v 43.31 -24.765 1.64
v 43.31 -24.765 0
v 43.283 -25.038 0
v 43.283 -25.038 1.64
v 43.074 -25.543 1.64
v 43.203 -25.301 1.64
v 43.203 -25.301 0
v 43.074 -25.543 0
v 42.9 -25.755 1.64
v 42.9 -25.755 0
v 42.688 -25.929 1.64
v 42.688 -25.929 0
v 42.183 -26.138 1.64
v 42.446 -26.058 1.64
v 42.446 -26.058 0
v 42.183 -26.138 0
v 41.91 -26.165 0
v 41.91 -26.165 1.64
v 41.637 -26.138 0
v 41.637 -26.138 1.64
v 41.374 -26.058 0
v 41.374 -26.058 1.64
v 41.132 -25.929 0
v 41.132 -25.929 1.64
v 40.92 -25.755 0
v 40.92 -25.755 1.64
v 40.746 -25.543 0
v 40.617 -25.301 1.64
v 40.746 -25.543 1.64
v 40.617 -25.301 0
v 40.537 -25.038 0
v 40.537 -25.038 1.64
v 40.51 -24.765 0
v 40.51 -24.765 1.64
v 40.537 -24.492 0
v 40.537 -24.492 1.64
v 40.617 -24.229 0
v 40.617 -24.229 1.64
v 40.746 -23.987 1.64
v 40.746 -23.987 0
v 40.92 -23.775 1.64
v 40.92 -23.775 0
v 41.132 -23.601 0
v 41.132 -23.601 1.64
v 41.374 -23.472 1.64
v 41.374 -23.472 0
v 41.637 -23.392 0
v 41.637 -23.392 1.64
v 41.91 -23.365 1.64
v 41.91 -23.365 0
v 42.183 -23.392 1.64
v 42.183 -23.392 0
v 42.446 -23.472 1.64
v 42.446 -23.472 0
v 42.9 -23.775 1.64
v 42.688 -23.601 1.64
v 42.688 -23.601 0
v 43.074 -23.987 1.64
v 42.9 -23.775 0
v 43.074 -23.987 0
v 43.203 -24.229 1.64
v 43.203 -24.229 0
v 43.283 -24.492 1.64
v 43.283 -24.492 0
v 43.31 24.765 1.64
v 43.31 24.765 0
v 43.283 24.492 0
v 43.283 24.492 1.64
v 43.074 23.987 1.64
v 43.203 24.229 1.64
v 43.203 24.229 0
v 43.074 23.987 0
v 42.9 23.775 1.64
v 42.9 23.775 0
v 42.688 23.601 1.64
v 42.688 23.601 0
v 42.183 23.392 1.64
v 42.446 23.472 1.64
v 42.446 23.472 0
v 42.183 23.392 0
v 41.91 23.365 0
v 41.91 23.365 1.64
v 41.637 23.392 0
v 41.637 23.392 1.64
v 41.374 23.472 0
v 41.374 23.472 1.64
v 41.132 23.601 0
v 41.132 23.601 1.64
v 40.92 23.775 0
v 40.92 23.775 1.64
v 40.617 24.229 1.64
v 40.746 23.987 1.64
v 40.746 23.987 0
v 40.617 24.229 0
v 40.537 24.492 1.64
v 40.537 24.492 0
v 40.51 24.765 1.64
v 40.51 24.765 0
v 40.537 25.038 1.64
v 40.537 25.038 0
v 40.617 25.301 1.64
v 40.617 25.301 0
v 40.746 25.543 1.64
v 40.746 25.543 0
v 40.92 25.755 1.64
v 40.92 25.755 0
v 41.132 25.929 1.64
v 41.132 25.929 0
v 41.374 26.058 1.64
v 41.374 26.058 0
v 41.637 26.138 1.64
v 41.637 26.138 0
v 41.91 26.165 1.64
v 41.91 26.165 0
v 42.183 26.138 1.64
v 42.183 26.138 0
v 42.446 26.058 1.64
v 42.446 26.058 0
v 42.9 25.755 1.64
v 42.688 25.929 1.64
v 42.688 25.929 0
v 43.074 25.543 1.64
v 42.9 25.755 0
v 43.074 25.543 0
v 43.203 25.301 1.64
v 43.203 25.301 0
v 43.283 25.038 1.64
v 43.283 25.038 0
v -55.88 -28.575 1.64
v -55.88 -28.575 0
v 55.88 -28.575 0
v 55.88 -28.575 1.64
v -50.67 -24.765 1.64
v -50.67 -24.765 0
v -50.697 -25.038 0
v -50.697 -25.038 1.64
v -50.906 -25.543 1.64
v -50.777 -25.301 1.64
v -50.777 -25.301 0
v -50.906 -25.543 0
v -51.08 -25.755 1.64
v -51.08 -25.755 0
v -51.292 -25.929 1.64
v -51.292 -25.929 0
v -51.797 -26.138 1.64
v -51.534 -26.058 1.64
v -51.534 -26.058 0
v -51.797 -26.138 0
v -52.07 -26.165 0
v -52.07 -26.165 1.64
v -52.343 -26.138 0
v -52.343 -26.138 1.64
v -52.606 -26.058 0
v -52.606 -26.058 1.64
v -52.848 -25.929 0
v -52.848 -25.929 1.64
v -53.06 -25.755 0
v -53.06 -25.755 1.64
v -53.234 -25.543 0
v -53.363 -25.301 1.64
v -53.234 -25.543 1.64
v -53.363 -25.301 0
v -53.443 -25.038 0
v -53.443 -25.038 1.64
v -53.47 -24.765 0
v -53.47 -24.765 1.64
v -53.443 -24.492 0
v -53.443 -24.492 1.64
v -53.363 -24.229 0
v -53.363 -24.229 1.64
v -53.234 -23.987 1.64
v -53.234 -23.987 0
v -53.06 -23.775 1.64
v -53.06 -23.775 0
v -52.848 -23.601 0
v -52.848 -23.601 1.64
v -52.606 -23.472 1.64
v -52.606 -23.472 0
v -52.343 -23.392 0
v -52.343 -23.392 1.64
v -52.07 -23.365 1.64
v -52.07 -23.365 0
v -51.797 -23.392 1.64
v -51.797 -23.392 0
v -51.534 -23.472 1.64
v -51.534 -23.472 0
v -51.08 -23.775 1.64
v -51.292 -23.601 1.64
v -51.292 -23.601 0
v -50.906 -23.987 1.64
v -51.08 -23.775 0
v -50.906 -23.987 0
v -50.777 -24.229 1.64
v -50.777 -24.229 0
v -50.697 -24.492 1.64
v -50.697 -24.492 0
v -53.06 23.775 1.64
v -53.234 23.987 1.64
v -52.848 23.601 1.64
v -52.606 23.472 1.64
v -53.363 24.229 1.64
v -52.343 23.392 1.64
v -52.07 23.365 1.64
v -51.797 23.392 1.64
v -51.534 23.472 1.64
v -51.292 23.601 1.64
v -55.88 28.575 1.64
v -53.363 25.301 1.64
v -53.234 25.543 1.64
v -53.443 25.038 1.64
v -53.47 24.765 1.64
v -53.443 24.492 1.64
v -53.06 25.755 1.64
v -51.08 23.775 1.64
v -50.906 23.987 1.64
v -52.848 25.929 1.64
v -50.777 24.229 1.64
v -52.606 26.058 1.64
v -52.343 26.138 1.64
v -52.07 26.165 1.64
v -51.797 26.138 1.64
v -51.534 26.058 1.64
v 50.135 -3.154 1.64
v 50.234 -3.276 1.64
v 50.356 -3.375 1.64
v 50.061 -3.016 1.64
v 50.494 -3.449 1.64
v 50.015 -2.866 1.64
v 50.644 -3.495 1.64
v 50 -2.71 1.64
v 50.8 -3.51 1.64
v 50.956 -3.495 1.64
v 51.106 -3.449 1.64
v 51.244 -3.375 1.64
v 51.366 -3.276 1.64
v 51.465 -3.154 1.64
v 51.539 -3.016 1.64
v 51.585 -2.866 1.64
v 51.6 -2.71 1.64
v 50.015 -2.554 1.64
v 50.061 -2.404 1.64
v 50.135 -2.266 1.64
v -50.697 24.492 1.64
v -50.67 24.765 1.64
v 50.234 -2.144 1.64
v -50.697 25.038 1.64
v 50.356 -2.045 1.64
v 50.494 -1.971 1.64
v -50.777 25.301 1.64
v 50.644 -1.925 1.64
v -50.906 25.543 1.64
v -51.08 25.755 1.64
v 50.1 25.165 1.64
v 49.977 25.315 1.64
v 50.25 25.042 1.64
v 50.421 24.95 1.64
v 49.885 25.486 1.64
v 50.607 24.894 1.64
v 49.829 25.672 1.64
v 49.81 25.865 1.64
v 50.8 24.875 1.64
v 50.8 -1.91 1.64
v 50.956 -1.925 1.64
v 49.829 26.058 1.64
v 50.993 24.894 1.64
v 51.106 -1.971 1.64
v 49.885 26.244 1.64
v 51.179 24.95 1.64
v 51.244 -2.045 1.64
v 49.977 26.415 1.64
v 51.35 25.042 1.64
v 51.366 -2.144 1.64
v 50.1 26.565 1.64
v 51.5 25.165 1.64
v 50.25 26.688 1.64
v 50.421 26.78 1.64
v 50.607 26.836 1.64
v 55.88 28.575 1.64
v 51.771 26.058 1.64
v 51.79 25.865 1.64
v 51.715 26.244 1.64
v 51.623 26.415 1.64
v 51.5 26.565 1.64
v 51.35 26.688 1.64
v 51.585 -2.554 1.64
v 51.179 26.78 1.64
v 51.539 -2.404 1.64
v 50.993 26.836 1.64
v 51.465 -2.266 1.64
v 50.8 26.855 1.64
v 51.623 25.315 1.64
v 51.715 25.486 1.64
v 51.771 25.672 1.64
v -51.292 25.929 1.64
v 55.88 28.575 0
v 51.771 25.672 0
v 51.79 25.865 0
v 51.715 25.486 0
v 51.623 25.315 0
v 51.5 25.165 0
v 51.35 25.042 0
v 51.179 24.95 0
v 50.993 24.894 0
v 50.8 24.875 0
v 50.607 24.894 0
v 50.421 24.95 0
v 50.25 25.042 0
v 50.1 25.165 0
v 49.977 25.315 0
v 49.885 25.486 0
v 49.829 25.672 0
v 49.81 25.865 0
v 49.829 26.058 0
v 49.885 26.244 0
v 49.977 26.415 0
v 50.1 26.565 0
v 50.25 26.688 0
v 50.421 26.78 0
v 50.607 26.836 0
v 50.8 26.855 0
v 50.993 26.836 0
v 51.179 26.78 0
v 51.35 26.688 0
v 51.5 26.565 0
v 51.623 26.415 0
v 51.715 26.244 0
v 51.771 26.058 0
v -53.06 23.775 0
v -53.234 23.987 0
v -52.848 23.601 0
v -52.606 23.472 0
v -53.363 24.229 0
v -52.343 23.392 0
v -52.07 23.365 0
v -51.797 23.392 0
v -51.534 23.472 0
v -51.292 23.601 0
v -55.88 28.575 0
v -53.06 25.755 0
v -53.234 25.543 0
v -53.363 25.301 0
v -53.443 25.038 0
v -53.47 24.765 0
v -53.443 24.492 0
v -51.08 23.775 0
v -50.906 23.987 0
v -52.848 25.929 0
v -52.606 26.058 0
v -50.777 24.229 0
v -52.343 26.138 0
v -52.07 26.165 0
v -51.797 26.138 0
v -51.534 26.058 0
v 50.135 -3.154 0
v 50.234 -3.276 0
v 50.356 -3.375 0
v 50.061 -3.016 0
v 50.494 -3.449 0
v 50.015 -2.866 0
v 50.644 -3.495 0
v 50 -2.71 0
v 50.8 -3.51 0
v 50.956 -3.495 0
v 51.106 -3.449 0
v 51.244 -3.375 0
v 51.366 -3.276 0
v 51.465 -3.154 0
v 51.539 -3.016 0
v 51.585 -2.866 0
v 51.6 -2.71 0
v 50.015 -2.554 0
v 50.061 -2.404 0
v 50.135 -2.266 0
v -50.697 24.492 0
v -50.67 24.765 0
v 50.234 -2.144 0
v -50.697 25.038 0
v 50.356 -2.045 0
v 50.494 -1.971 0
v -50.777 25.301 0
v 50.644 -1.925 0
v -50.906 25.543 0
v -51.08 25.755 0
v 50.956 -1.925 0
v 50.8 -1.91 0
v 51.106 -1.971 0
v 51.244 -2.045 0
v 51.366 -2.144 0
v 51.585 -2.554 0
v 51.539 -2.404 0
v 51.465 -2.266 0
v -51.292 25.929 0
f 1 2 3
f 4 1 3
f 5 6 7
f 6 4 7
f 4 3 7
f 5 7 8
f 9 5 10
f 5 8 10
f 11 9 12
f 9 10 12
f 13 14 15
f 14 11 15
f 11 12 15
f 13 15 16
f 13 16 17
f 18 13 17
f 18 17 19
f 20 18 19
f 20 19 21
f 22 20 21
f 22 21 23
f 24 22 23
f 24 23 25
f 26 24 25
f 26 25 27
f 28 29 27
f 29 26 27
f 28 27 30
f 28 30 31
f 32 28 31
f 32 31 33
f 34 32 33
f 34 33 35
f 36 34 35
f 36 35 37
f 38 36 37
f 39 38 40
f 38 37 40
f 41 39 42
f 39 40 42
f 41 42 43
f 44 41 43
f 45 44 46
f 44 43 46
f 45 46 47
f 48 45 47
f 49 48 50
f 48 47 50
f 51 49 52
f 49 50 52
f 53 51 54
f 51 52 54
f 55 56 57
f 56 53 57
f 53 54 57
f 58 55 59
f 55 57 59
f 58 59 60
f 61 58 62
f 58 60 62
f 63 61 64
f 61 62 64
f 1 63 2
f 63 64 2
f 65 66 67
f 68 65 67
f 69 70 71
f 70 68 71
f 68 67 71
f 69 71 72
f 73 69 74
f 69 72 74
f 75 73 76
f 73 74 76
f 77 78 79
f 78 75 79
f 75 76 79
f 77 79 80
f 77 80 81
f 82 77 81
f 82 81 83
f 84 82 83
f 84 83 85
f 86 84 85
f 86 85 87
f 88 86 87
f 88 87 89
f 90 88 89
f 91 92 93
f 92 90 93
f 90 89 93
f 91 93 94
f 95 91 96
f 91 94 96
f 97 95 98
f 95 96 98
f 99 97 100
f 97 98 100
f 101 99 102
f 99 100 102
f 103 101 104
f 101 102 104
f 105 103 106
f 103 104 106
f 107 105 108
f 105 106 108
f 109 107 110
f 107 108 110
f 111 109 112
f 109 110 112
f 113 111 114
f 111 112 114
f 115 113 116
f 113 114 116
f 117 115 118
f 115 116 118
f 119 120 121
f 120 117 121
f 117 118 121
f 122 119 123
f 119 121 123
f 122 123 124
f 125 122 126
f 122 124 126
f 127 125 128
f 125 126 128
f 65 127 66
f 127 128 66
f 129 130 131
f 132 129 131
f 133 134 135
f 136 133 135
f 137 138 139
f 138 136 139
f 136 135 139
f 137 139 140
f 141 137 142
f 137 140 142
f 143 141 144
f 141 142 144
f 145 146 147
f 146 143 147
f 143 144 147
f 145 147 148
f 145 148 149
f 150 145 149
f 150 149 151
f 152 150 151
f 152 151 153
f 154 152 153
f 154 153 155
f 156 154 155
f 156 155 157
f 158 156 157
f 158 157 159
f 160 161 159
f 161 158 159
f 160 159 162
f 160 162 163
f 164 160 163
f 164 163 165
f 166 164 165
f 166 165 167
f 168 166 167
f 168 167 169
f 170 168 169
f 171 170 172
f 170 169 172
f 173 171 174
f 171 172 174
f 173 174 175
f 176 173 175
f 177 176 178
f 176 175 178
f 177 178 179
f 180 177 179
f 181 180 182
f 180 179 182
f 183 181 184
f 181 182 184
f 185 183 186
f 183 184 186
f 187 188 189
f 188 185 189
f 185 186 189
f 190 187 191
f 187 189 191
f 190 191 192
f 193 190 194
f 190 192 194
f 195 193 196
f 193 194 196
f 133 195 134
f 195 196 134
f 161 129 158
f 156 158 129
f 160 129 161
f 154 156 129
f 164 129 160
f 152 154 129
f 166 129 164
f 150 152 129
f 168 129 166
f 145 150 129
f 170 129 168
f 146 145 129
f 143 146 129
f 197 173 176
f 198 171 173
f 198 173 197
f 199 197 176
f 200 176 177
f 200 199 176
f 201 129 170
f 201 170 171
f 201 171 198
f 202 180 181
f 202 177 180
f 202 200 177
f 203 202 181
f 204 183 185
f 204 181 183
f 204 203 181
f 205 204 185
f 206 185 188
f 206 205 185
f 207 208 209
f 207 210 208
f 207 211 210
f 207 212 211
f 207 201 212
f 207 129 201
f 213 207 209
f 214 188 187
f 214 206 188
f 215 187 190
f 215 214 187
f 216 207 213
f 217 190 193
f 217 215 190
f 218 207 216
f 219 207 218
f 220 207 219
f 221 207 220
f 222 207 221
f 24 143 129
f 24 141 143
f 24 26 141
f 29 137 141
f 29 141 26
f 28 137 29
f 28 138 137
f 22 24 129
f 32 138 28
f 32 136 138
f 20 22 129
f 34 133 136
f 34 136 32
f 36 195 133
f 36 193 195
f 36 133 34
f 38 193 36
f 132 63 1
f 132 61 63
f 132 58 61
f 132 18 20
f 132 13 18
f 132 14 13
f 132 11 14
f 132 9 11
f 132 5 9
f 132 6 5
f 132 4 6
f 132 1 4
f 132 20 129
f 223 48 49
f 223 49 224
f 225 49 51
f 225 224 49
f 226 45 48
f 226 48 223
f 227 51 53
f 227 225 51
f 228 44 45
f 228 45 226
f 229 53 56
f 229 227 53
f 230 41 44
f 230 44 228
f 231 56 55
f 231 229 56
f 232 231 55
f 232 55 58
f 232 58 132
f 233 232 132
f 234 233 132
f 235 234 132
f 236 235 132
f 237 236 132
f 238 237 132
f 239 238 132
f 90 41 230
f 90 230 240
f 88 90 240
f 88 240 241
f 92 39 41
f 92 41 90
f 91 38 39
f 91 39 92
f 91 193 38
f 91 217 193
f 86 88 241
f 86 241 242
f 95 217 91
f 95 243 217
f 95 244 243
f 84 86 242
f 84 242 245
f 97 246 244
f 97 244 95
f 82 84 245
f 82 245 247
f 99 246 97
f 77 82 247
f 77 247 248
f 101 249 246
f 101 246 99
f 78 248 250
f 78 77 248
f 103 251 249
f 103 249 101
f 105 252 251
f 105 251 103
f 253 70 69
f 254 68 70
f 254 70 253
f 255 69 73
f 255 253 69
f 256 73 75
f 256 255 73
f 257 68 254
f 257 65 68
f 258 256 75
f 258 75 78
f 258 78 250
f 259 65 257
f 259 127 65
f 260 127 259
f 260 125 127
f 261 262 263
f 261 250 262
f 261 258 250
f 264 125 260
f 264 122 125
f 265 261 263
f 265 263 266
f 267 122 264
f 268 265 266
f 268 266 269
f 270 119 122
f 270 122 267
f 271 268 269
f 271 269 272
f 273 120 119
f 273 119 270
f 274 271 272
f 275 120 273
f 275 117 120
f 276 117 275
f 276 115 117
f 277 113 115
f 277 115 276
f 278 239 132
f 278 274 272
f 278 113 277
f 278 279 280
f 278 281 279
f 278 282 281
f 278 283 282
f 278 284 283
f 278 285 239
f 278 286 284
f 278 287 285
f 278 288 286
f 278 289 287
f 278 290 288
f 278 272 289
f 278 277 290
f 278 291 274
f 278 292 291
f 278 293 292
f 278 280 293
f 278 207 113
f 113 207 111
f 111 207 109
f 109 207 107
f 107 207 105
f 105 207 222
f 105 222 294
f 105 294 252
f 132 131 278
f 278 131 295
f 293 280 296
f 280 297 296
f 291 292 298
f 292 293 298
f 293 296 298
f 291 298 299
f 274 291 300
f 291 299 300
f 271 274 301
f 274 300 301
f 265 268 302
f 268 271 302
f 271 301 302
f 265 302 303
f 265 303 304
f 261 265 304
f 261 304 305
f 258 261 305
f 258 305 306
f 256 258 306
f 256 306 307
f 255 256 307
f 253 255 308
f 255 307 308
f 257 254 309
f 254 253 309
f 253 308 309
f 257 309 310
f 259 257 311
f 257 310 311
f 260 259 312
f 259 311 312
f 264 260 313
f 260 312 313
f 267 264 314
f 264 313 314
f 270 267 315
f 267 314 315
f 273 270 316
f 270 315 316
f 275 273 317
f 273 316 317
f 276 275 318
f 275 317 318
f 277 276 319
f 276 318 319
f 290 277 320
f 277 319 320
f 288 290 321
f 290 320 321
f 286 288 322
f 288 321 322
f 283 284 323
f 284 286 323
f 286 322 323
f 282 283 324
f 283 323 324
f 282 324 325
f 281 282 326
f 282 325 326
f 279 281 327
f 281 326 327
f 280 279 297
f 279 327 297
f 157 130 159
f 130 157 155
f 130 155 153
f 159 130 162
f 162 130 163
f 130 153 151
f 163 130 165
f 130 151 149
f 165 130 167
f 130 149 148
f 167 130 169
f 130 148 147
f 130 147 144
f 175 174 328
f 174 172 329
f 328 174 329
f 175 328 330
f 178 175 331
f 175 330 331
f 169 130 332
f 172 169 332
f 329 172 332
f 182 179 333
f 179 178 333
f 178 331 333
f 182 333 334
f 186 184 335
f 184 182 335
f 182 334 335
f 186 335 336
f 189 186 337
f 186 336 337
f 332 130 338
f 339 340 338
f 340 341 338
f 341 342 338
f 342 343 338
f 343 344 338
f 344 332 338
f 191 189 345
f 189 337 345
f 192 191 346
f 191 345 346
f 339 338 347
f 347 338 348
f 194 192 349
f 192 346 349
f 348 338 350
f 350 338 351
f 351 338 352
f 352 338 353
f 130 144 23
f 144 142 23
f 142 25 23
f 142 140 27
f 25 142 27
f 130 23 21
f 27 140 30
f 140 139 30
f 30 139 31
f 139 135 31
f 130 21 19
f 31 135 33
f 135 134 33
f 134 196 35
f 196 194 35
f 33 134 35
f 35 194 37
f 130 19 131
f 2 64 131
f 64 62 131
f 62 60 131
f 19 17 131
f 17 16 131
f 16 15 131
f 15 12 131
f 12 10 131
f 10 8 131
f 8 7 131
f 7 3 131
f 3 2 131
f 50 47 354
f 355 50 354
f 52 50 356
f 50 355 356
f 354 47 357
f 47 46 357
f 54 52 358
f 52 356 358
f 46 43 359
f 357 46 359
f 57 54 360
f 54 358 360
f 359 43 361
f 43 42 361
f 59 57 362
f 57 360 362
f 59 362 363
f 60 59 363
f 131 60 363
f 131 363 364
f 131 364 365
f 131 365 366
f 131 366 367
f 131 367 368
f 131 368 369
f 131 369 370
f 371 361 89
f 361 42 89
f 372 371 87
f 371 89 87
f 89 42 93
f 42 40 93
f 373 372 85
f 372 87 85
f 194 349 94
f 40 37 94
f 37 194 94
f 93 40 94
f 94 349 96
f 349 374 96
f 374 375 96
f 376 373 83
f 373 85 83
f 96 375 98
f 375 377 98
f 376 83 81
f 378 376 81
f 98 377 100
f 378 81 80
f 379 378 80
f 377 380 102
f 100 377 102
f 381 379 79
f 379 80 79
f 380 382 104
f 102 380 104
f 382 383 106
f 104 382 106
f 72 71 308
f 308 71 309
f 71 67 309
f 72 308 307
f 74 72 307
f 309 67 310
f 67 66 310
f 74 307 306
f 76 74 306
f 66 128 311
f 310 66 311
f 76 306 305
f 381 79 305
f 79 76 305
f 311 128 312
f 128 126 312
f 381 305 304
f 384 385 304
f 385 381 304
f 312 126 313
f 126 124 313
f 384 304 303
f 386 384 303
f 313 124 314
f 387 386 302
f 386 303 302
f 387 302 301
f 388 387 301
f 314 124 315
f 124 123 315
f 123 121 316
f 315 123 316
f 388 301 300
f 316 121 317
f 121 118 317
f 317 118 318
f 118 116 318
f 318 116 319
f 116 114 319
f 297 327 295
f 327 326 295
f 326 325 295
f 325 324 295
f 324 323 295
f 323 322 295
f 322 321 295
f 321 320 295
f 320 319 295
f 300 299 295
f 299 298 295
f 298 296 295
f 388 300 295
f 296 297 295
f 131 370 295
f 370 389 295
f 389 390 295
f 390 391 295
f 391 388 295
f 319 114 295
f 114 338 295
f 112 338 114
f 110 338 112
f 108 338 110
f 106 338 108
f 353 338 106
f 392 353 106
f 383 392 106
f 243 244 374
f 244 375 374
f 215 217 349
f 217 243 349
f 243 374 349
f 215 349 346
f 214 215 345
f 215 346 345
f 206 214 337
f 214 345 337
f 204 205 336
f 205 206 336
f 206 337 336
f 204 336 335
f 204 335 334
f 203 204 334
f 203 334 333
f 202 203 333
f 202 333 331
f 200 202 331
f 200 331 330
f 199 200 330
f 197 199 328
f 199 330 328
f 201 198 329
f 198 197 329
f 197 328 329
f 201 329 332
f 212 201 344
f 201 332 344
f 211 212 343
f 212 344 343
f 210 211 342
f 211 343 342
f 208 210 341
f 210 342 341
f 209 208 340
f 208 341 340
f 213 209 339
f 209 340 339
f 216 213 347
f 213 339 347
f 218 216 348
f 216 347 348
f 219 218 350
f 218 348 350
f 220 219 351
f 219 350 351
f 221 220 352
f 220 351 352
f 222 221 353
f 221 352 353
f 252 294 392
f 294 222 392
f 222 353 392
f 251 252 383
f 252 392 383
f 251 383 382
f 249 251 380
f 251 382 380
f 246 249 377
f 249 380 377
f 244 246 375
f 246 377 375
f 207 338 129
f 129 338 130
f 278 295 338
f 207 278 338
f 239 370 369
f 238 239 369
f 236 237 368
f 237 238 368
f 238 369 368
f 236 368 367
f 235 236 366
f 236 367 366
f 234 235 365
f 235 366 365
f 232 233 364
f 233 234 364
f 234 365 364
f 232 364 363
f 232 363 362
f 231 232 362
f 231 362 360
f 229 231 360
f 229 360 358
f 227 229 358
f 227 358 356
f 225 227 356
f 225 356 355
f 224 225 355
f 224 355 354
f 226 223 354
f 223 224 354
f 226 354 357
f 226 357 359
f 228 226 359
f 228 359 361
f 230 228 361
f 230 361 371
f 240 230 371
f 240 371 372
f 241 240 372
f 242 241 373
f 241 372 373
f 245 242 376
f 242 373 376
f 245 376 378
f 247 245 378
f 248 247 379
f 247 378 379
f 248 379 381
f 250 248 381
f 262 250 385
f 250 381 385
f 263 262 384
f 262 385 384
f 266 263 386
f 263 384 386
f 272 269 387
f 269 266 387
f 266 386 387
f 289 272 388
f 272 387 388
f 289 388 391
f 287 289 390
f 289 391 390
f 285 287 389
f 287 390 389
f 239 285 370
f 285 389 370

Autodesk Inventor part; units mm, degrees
ref_plane "YZ Plane" through (0, 0, 0) normal (1, 0, 0) x (0, 1, 0)
ref_plane "XZ Plane" through (0, 0, 0) normal (0, 1, 0) x (-1, 0, 0)
ref_plane "XY Plane" through (0, 0, 0) normal (0, 0, 1) x (1, 0, 0)
sketch "Sketch1" plane through (0, 0, 0) normal (0, 0, 1) x (1, 0, 0)
  line L0 (-55.88, -28.575) -> (55.88, -28.575)
  line L1 (55.88, -28.575) -> (55.88, 28.575)
  line L2 (55.88, 28.575) -> (-55.88, 28.575)
  line L3 (-55.88, 28.575) -> (-55.88, -28.575)
  line L4 (-55.88, -28.575) -> (55.88, 28.575) construction
  line L5 (55.88, -28.575) -> (-55.88, 28.575) construction
  circle A0 centre (-52.07, 24.765) radius 1.4
  line L6 (-55.88, 0) -> (55.88, 0) construction
  line L7 (0, 28.575) -> (0, -28.575) construction
  circle A1 centre (-52.07, -24.765) radius 1.4
  circle A2 centre (-31.75, 24.765) radius 1.4
  circle A3 centre (31.75, 24.765) radius 1.4
  circle A4 centre (-31.75, -24.765) radius 1.4
  circle A5 centre (31.75, -24.765) radius 1.4
  circle A6 centre (50.8, 25.865) radius 0.99
  circle A7 centre (41.91, 24.765) radius 1.4
  circle A8 centre (41.91, -24.765) radius 1.4
  circle A9 centre (50.8, -2.71) radius 0.8
  point P0 (0, 0)
  dimension "d2" = 111.76
  dimension "d4" = 57.15
  dimension "d5" = 49.53
  dimension "d6" = 2.8
  dimension "d8" = 2.8
  dimension "d10" = 49.53
  dimension "d21" = 3.81
  dimension "d22" = 3.81
  dimension "d23" = 3.81
  dimension "d28" = 3.81
  dimension "d30" = 63.5
  dimension "d35" = 1.98
  dimension "d36" = 5.08
  dimension "d37" = 2.71
  dimension "d38" = 2.8
  dimension "d39" = 3.81
  dimension "d40" = 13.97
  dimension "d41" = 63.5
  dimension "d42" = 1.6
  dimension "d43" = 5.08
  dimension "d44" = 2.71
extrude "Extrusion1" add sketch "Sketch1" along normal blind 1.64 contours L3 L2 L1 L0 | A2 | A3 | A4 | A5
sketch "Sketch3" plane through (0, 0, 1.64) normal (0, 0, 1) x (1, 0, 0)
  circle A0 centre (26.67, -24.765) radius 1.4 projected
  circle A1 centre (-26.67, -24.765) radius 1.4 projected
  line L0 (55.88, 28.575) -> (-55.88, 28.575) projected
  line L1 (-21.67, -25.765) -> (21.67, -25.765)
  line L2 (21.67, -25.765) -> (21.67, 30.575)
  line L3 (21.67, 30.575) -> (-21.67, 30.575)
  line L4 (-21.67, 30.575) -> (-21.67, -25.765)
  line L5 (55.88, -28.575) -> (55.88, 28.575) projected
  line L6 (-55.88, 28.575) -> (-55.88, -28.575) projected
  point P0 (0, 0)
  dimension "d15" = 2
  dimension "d16" = 5
  dimension "d17" = 5
  dimension "d18" = 1
  dimension "d33" = 34.21
  dimension "d34" = 34.21
extrude "Extrusion3" [suppressed]
sketch "Sketch4" plane through (0, 0, 0) normal (0, 0, -1) x (-1, 0, 0)
  line L0 (-55.88, 28.575) -> (55.88, 28.575) construction
  line L1 (55.88, 28.575) -> (55.88, -28.575) construction
  line L2 (55.88, -28.575) -> (-55.88, -28.575) construction
  line L3 (-55.88, -28.575) -> (-55.88, 28.575) construction
  circle A0 centre (-41.91, -24.765) radius 1.4 projected
  circle A1 centre (-41.91, 24.765) radius 1.4 projected
  circle A2 centre (52.07, -24.765) radius 1.4 projected
  circle A3 centre (52.07, 24.765) radius 1.4 projected
  circle A4 centre (-50.8, 25.865) radius 0.99 projected
  circle A5 centre (-50.8, -2.71) radius 0.8 projected
  line L4 (55.88, -28.575) -> (-55.88, -28.575) projected
  line L5 (55.88, 28.575) -> (55.88, -28.575) projected
  line L6 (-55.88, 28.575) -> (55.88, 28.575) projected
  line L7 (-55.88, -28.575) -> (-55.88, 28.575) projected
  point P0 (0, 0)
sketch "Sketch5" plane through (0, 0, 1.64) normal (0, 0, 1) x (1, 0, 0)
  circle A0 centre (41.91, -24.765) radius 1.4 projected
  circle A1 centre (41.91, 24.765) radius 1.4 projected
  circle A2 centre (-52.07, -24.765) radius 1.4 projected
  circle A3 centre (-52.07, 24.765) radius 1.4 projected
  circle A4 centre (50.8, 25.865) radius 0.99 projected
  circle A5 centre (50.8, -2.71) radius 0.8 projected
  line L0 (-55.88, -28.575) -> (55.88, -28.575) projected
  line L1 (55.88, -28.575) -> (55.88, 28.575) projected
  line L2 (55.88, 28.575) -> (-55.88, 28.575) projected
  line L3 (-55.88, 28.575) -> (-55.88, -28.575) projected
  line L4 (55.88, -28.575) -> (-55.88, -28.575) construction
  line L5 (-55.88, -28.575) -> (-55.88, 28.575) construction
  line L6 (-55.88, 28.575) -> (55.88, 28.575) construction
  line L7 (55.88, 28.575) -> (55.88, -28.575) construction
  point P0 (0, 0)
properties part number "BetaBoard01" material "PCB(1)"
